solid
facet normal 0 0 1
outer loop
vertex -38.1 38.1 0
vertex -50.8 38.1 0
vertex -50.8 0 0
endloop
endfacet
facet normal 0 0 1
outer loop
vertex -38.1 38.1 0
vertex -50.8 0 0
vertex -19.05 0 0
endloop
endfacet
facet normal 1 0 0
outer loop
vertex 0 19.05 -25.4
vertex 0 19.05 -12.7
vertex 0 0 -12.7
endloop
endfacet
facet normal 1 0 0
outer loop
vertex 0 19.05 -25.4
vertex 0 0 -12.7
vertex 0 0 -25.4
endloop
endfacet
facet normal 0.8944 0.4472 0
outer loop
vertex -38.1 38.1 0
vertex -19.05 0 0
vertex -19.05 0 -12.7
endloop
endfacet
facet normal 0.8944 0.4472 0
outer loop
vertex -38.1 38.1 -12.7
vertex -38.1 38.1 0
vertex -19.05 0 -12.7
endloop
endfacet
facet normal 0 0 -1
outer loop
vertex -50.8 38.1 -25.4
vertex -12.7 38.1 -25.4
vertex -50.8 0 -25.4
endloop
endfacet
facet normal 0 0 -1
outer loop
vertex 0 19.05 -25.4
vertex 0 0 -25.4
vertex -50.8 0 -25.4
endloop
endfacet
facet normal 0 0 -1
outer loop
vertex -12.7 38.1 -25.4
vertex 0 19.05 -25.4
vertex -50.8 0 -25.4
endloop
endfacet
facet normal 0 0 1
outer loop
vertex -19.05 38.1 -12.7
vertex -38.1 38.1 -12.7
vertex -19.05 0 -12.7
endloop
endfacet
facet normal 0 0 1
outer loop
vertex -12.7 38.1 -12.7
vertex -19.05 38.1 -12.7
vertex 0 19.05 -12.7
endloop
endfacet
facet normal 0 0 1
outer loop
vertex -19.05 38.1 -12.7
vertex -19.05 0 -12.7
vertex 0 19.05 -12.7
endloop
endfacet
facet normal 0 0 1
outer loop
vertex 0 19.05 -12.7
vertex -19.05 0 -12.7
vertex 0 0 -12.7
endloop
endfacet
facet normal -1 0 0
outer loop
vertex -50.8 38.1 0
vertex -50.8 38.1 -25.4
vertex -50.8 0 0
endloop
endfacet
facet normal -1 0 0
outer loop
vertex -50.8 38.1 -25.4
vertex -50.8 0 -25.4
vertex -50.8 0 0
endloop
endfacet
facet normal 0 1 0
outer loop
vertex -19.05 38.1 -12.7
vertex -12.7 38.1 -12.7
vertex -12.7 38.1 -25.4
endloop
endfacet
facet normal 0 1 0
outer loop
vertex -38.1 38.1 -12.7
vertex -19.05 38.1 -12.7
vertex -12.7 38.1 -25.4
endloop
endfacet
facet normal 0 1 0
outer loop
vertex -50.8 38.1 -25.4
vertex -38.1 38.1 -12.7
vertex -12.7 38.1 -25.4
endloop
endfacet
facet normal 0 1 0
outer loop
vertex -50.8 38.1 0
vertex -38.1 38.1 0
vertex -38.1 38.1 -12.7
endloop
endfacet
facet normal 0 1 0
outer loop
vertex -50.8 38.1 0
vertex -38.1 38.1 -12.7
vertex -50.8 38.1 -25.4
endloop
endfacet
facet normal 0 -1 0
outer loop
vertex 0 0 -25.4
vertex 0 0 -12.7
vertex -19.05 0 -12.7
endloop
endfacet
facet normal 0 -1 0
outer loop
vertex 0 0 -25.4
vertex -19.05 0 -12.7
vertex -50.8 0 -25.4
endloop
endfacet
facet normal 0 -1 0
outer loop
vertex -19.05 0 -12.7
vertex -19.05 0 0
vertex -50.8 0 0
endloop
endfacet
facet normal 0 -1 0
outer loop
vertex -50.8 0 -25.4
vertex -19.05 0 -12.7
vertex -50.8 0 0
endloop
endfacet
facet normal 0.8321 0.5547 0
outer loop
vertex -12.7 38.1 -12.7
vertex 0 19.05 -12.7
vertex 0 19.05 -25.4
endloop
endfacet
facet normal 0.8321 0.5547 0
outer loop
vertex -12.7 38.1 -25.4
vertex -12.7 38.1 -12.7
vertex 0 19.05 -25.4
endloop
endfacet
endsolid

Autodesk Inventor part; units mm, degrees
ref_plane "YZ Plane" through (0, 0, 0) normal (1, 0, 0) x (0, 1, 0)
ref_plane "XZ Plane" through (0, 0, 0) normal (0, 1, 0) x (-1, 0, 0)
ref_plane "XY Plane" through (0, 0, 0) normal (0, 0, 1) x (1, 0, 0)
sketch "Sketch1" plane through (0, 0, 0) normal (0, 1, 0) x (-1, 0, 0)
  line L0 (0, -12.7) -> (0, -25.4)
  line L1 (0, -25.4) -> (50.8, -25.4)
  line L2 (50.8, -25.4) -> (50.8, 0)
  line L3 (50.8, 0) -> (19.05, 0)
  line L4 (19.05, 0) -> (19.05, -12.7)
  line L5 (19.05, -12.7) -> (0, -12.7)
  point P0 (0, 0)
  dimension "d0" = 12.7
  dimension "d1" = 50.8
  dimension "d2" = 25.4
  dimension "d3" = 31.75
  dimension "d4" = 12.7
extrude "Extrusion1" add sketch "Sketch1" along normal blind 38.1
chamfer "Chamfer1" distance 19.05 distance2 38.1 1 edges at (-19.05, 38.1, -6.35) measured on face at (-40.2167, 38.1, -12.7)
chamfer "Chamfer2" distance 12.7 distance2 19.05 1 edges at (0, 38.1, -19.05) measured on face at (-23.2833, 38.1, -21.1667)
properties part number "7.1 Part 4"
